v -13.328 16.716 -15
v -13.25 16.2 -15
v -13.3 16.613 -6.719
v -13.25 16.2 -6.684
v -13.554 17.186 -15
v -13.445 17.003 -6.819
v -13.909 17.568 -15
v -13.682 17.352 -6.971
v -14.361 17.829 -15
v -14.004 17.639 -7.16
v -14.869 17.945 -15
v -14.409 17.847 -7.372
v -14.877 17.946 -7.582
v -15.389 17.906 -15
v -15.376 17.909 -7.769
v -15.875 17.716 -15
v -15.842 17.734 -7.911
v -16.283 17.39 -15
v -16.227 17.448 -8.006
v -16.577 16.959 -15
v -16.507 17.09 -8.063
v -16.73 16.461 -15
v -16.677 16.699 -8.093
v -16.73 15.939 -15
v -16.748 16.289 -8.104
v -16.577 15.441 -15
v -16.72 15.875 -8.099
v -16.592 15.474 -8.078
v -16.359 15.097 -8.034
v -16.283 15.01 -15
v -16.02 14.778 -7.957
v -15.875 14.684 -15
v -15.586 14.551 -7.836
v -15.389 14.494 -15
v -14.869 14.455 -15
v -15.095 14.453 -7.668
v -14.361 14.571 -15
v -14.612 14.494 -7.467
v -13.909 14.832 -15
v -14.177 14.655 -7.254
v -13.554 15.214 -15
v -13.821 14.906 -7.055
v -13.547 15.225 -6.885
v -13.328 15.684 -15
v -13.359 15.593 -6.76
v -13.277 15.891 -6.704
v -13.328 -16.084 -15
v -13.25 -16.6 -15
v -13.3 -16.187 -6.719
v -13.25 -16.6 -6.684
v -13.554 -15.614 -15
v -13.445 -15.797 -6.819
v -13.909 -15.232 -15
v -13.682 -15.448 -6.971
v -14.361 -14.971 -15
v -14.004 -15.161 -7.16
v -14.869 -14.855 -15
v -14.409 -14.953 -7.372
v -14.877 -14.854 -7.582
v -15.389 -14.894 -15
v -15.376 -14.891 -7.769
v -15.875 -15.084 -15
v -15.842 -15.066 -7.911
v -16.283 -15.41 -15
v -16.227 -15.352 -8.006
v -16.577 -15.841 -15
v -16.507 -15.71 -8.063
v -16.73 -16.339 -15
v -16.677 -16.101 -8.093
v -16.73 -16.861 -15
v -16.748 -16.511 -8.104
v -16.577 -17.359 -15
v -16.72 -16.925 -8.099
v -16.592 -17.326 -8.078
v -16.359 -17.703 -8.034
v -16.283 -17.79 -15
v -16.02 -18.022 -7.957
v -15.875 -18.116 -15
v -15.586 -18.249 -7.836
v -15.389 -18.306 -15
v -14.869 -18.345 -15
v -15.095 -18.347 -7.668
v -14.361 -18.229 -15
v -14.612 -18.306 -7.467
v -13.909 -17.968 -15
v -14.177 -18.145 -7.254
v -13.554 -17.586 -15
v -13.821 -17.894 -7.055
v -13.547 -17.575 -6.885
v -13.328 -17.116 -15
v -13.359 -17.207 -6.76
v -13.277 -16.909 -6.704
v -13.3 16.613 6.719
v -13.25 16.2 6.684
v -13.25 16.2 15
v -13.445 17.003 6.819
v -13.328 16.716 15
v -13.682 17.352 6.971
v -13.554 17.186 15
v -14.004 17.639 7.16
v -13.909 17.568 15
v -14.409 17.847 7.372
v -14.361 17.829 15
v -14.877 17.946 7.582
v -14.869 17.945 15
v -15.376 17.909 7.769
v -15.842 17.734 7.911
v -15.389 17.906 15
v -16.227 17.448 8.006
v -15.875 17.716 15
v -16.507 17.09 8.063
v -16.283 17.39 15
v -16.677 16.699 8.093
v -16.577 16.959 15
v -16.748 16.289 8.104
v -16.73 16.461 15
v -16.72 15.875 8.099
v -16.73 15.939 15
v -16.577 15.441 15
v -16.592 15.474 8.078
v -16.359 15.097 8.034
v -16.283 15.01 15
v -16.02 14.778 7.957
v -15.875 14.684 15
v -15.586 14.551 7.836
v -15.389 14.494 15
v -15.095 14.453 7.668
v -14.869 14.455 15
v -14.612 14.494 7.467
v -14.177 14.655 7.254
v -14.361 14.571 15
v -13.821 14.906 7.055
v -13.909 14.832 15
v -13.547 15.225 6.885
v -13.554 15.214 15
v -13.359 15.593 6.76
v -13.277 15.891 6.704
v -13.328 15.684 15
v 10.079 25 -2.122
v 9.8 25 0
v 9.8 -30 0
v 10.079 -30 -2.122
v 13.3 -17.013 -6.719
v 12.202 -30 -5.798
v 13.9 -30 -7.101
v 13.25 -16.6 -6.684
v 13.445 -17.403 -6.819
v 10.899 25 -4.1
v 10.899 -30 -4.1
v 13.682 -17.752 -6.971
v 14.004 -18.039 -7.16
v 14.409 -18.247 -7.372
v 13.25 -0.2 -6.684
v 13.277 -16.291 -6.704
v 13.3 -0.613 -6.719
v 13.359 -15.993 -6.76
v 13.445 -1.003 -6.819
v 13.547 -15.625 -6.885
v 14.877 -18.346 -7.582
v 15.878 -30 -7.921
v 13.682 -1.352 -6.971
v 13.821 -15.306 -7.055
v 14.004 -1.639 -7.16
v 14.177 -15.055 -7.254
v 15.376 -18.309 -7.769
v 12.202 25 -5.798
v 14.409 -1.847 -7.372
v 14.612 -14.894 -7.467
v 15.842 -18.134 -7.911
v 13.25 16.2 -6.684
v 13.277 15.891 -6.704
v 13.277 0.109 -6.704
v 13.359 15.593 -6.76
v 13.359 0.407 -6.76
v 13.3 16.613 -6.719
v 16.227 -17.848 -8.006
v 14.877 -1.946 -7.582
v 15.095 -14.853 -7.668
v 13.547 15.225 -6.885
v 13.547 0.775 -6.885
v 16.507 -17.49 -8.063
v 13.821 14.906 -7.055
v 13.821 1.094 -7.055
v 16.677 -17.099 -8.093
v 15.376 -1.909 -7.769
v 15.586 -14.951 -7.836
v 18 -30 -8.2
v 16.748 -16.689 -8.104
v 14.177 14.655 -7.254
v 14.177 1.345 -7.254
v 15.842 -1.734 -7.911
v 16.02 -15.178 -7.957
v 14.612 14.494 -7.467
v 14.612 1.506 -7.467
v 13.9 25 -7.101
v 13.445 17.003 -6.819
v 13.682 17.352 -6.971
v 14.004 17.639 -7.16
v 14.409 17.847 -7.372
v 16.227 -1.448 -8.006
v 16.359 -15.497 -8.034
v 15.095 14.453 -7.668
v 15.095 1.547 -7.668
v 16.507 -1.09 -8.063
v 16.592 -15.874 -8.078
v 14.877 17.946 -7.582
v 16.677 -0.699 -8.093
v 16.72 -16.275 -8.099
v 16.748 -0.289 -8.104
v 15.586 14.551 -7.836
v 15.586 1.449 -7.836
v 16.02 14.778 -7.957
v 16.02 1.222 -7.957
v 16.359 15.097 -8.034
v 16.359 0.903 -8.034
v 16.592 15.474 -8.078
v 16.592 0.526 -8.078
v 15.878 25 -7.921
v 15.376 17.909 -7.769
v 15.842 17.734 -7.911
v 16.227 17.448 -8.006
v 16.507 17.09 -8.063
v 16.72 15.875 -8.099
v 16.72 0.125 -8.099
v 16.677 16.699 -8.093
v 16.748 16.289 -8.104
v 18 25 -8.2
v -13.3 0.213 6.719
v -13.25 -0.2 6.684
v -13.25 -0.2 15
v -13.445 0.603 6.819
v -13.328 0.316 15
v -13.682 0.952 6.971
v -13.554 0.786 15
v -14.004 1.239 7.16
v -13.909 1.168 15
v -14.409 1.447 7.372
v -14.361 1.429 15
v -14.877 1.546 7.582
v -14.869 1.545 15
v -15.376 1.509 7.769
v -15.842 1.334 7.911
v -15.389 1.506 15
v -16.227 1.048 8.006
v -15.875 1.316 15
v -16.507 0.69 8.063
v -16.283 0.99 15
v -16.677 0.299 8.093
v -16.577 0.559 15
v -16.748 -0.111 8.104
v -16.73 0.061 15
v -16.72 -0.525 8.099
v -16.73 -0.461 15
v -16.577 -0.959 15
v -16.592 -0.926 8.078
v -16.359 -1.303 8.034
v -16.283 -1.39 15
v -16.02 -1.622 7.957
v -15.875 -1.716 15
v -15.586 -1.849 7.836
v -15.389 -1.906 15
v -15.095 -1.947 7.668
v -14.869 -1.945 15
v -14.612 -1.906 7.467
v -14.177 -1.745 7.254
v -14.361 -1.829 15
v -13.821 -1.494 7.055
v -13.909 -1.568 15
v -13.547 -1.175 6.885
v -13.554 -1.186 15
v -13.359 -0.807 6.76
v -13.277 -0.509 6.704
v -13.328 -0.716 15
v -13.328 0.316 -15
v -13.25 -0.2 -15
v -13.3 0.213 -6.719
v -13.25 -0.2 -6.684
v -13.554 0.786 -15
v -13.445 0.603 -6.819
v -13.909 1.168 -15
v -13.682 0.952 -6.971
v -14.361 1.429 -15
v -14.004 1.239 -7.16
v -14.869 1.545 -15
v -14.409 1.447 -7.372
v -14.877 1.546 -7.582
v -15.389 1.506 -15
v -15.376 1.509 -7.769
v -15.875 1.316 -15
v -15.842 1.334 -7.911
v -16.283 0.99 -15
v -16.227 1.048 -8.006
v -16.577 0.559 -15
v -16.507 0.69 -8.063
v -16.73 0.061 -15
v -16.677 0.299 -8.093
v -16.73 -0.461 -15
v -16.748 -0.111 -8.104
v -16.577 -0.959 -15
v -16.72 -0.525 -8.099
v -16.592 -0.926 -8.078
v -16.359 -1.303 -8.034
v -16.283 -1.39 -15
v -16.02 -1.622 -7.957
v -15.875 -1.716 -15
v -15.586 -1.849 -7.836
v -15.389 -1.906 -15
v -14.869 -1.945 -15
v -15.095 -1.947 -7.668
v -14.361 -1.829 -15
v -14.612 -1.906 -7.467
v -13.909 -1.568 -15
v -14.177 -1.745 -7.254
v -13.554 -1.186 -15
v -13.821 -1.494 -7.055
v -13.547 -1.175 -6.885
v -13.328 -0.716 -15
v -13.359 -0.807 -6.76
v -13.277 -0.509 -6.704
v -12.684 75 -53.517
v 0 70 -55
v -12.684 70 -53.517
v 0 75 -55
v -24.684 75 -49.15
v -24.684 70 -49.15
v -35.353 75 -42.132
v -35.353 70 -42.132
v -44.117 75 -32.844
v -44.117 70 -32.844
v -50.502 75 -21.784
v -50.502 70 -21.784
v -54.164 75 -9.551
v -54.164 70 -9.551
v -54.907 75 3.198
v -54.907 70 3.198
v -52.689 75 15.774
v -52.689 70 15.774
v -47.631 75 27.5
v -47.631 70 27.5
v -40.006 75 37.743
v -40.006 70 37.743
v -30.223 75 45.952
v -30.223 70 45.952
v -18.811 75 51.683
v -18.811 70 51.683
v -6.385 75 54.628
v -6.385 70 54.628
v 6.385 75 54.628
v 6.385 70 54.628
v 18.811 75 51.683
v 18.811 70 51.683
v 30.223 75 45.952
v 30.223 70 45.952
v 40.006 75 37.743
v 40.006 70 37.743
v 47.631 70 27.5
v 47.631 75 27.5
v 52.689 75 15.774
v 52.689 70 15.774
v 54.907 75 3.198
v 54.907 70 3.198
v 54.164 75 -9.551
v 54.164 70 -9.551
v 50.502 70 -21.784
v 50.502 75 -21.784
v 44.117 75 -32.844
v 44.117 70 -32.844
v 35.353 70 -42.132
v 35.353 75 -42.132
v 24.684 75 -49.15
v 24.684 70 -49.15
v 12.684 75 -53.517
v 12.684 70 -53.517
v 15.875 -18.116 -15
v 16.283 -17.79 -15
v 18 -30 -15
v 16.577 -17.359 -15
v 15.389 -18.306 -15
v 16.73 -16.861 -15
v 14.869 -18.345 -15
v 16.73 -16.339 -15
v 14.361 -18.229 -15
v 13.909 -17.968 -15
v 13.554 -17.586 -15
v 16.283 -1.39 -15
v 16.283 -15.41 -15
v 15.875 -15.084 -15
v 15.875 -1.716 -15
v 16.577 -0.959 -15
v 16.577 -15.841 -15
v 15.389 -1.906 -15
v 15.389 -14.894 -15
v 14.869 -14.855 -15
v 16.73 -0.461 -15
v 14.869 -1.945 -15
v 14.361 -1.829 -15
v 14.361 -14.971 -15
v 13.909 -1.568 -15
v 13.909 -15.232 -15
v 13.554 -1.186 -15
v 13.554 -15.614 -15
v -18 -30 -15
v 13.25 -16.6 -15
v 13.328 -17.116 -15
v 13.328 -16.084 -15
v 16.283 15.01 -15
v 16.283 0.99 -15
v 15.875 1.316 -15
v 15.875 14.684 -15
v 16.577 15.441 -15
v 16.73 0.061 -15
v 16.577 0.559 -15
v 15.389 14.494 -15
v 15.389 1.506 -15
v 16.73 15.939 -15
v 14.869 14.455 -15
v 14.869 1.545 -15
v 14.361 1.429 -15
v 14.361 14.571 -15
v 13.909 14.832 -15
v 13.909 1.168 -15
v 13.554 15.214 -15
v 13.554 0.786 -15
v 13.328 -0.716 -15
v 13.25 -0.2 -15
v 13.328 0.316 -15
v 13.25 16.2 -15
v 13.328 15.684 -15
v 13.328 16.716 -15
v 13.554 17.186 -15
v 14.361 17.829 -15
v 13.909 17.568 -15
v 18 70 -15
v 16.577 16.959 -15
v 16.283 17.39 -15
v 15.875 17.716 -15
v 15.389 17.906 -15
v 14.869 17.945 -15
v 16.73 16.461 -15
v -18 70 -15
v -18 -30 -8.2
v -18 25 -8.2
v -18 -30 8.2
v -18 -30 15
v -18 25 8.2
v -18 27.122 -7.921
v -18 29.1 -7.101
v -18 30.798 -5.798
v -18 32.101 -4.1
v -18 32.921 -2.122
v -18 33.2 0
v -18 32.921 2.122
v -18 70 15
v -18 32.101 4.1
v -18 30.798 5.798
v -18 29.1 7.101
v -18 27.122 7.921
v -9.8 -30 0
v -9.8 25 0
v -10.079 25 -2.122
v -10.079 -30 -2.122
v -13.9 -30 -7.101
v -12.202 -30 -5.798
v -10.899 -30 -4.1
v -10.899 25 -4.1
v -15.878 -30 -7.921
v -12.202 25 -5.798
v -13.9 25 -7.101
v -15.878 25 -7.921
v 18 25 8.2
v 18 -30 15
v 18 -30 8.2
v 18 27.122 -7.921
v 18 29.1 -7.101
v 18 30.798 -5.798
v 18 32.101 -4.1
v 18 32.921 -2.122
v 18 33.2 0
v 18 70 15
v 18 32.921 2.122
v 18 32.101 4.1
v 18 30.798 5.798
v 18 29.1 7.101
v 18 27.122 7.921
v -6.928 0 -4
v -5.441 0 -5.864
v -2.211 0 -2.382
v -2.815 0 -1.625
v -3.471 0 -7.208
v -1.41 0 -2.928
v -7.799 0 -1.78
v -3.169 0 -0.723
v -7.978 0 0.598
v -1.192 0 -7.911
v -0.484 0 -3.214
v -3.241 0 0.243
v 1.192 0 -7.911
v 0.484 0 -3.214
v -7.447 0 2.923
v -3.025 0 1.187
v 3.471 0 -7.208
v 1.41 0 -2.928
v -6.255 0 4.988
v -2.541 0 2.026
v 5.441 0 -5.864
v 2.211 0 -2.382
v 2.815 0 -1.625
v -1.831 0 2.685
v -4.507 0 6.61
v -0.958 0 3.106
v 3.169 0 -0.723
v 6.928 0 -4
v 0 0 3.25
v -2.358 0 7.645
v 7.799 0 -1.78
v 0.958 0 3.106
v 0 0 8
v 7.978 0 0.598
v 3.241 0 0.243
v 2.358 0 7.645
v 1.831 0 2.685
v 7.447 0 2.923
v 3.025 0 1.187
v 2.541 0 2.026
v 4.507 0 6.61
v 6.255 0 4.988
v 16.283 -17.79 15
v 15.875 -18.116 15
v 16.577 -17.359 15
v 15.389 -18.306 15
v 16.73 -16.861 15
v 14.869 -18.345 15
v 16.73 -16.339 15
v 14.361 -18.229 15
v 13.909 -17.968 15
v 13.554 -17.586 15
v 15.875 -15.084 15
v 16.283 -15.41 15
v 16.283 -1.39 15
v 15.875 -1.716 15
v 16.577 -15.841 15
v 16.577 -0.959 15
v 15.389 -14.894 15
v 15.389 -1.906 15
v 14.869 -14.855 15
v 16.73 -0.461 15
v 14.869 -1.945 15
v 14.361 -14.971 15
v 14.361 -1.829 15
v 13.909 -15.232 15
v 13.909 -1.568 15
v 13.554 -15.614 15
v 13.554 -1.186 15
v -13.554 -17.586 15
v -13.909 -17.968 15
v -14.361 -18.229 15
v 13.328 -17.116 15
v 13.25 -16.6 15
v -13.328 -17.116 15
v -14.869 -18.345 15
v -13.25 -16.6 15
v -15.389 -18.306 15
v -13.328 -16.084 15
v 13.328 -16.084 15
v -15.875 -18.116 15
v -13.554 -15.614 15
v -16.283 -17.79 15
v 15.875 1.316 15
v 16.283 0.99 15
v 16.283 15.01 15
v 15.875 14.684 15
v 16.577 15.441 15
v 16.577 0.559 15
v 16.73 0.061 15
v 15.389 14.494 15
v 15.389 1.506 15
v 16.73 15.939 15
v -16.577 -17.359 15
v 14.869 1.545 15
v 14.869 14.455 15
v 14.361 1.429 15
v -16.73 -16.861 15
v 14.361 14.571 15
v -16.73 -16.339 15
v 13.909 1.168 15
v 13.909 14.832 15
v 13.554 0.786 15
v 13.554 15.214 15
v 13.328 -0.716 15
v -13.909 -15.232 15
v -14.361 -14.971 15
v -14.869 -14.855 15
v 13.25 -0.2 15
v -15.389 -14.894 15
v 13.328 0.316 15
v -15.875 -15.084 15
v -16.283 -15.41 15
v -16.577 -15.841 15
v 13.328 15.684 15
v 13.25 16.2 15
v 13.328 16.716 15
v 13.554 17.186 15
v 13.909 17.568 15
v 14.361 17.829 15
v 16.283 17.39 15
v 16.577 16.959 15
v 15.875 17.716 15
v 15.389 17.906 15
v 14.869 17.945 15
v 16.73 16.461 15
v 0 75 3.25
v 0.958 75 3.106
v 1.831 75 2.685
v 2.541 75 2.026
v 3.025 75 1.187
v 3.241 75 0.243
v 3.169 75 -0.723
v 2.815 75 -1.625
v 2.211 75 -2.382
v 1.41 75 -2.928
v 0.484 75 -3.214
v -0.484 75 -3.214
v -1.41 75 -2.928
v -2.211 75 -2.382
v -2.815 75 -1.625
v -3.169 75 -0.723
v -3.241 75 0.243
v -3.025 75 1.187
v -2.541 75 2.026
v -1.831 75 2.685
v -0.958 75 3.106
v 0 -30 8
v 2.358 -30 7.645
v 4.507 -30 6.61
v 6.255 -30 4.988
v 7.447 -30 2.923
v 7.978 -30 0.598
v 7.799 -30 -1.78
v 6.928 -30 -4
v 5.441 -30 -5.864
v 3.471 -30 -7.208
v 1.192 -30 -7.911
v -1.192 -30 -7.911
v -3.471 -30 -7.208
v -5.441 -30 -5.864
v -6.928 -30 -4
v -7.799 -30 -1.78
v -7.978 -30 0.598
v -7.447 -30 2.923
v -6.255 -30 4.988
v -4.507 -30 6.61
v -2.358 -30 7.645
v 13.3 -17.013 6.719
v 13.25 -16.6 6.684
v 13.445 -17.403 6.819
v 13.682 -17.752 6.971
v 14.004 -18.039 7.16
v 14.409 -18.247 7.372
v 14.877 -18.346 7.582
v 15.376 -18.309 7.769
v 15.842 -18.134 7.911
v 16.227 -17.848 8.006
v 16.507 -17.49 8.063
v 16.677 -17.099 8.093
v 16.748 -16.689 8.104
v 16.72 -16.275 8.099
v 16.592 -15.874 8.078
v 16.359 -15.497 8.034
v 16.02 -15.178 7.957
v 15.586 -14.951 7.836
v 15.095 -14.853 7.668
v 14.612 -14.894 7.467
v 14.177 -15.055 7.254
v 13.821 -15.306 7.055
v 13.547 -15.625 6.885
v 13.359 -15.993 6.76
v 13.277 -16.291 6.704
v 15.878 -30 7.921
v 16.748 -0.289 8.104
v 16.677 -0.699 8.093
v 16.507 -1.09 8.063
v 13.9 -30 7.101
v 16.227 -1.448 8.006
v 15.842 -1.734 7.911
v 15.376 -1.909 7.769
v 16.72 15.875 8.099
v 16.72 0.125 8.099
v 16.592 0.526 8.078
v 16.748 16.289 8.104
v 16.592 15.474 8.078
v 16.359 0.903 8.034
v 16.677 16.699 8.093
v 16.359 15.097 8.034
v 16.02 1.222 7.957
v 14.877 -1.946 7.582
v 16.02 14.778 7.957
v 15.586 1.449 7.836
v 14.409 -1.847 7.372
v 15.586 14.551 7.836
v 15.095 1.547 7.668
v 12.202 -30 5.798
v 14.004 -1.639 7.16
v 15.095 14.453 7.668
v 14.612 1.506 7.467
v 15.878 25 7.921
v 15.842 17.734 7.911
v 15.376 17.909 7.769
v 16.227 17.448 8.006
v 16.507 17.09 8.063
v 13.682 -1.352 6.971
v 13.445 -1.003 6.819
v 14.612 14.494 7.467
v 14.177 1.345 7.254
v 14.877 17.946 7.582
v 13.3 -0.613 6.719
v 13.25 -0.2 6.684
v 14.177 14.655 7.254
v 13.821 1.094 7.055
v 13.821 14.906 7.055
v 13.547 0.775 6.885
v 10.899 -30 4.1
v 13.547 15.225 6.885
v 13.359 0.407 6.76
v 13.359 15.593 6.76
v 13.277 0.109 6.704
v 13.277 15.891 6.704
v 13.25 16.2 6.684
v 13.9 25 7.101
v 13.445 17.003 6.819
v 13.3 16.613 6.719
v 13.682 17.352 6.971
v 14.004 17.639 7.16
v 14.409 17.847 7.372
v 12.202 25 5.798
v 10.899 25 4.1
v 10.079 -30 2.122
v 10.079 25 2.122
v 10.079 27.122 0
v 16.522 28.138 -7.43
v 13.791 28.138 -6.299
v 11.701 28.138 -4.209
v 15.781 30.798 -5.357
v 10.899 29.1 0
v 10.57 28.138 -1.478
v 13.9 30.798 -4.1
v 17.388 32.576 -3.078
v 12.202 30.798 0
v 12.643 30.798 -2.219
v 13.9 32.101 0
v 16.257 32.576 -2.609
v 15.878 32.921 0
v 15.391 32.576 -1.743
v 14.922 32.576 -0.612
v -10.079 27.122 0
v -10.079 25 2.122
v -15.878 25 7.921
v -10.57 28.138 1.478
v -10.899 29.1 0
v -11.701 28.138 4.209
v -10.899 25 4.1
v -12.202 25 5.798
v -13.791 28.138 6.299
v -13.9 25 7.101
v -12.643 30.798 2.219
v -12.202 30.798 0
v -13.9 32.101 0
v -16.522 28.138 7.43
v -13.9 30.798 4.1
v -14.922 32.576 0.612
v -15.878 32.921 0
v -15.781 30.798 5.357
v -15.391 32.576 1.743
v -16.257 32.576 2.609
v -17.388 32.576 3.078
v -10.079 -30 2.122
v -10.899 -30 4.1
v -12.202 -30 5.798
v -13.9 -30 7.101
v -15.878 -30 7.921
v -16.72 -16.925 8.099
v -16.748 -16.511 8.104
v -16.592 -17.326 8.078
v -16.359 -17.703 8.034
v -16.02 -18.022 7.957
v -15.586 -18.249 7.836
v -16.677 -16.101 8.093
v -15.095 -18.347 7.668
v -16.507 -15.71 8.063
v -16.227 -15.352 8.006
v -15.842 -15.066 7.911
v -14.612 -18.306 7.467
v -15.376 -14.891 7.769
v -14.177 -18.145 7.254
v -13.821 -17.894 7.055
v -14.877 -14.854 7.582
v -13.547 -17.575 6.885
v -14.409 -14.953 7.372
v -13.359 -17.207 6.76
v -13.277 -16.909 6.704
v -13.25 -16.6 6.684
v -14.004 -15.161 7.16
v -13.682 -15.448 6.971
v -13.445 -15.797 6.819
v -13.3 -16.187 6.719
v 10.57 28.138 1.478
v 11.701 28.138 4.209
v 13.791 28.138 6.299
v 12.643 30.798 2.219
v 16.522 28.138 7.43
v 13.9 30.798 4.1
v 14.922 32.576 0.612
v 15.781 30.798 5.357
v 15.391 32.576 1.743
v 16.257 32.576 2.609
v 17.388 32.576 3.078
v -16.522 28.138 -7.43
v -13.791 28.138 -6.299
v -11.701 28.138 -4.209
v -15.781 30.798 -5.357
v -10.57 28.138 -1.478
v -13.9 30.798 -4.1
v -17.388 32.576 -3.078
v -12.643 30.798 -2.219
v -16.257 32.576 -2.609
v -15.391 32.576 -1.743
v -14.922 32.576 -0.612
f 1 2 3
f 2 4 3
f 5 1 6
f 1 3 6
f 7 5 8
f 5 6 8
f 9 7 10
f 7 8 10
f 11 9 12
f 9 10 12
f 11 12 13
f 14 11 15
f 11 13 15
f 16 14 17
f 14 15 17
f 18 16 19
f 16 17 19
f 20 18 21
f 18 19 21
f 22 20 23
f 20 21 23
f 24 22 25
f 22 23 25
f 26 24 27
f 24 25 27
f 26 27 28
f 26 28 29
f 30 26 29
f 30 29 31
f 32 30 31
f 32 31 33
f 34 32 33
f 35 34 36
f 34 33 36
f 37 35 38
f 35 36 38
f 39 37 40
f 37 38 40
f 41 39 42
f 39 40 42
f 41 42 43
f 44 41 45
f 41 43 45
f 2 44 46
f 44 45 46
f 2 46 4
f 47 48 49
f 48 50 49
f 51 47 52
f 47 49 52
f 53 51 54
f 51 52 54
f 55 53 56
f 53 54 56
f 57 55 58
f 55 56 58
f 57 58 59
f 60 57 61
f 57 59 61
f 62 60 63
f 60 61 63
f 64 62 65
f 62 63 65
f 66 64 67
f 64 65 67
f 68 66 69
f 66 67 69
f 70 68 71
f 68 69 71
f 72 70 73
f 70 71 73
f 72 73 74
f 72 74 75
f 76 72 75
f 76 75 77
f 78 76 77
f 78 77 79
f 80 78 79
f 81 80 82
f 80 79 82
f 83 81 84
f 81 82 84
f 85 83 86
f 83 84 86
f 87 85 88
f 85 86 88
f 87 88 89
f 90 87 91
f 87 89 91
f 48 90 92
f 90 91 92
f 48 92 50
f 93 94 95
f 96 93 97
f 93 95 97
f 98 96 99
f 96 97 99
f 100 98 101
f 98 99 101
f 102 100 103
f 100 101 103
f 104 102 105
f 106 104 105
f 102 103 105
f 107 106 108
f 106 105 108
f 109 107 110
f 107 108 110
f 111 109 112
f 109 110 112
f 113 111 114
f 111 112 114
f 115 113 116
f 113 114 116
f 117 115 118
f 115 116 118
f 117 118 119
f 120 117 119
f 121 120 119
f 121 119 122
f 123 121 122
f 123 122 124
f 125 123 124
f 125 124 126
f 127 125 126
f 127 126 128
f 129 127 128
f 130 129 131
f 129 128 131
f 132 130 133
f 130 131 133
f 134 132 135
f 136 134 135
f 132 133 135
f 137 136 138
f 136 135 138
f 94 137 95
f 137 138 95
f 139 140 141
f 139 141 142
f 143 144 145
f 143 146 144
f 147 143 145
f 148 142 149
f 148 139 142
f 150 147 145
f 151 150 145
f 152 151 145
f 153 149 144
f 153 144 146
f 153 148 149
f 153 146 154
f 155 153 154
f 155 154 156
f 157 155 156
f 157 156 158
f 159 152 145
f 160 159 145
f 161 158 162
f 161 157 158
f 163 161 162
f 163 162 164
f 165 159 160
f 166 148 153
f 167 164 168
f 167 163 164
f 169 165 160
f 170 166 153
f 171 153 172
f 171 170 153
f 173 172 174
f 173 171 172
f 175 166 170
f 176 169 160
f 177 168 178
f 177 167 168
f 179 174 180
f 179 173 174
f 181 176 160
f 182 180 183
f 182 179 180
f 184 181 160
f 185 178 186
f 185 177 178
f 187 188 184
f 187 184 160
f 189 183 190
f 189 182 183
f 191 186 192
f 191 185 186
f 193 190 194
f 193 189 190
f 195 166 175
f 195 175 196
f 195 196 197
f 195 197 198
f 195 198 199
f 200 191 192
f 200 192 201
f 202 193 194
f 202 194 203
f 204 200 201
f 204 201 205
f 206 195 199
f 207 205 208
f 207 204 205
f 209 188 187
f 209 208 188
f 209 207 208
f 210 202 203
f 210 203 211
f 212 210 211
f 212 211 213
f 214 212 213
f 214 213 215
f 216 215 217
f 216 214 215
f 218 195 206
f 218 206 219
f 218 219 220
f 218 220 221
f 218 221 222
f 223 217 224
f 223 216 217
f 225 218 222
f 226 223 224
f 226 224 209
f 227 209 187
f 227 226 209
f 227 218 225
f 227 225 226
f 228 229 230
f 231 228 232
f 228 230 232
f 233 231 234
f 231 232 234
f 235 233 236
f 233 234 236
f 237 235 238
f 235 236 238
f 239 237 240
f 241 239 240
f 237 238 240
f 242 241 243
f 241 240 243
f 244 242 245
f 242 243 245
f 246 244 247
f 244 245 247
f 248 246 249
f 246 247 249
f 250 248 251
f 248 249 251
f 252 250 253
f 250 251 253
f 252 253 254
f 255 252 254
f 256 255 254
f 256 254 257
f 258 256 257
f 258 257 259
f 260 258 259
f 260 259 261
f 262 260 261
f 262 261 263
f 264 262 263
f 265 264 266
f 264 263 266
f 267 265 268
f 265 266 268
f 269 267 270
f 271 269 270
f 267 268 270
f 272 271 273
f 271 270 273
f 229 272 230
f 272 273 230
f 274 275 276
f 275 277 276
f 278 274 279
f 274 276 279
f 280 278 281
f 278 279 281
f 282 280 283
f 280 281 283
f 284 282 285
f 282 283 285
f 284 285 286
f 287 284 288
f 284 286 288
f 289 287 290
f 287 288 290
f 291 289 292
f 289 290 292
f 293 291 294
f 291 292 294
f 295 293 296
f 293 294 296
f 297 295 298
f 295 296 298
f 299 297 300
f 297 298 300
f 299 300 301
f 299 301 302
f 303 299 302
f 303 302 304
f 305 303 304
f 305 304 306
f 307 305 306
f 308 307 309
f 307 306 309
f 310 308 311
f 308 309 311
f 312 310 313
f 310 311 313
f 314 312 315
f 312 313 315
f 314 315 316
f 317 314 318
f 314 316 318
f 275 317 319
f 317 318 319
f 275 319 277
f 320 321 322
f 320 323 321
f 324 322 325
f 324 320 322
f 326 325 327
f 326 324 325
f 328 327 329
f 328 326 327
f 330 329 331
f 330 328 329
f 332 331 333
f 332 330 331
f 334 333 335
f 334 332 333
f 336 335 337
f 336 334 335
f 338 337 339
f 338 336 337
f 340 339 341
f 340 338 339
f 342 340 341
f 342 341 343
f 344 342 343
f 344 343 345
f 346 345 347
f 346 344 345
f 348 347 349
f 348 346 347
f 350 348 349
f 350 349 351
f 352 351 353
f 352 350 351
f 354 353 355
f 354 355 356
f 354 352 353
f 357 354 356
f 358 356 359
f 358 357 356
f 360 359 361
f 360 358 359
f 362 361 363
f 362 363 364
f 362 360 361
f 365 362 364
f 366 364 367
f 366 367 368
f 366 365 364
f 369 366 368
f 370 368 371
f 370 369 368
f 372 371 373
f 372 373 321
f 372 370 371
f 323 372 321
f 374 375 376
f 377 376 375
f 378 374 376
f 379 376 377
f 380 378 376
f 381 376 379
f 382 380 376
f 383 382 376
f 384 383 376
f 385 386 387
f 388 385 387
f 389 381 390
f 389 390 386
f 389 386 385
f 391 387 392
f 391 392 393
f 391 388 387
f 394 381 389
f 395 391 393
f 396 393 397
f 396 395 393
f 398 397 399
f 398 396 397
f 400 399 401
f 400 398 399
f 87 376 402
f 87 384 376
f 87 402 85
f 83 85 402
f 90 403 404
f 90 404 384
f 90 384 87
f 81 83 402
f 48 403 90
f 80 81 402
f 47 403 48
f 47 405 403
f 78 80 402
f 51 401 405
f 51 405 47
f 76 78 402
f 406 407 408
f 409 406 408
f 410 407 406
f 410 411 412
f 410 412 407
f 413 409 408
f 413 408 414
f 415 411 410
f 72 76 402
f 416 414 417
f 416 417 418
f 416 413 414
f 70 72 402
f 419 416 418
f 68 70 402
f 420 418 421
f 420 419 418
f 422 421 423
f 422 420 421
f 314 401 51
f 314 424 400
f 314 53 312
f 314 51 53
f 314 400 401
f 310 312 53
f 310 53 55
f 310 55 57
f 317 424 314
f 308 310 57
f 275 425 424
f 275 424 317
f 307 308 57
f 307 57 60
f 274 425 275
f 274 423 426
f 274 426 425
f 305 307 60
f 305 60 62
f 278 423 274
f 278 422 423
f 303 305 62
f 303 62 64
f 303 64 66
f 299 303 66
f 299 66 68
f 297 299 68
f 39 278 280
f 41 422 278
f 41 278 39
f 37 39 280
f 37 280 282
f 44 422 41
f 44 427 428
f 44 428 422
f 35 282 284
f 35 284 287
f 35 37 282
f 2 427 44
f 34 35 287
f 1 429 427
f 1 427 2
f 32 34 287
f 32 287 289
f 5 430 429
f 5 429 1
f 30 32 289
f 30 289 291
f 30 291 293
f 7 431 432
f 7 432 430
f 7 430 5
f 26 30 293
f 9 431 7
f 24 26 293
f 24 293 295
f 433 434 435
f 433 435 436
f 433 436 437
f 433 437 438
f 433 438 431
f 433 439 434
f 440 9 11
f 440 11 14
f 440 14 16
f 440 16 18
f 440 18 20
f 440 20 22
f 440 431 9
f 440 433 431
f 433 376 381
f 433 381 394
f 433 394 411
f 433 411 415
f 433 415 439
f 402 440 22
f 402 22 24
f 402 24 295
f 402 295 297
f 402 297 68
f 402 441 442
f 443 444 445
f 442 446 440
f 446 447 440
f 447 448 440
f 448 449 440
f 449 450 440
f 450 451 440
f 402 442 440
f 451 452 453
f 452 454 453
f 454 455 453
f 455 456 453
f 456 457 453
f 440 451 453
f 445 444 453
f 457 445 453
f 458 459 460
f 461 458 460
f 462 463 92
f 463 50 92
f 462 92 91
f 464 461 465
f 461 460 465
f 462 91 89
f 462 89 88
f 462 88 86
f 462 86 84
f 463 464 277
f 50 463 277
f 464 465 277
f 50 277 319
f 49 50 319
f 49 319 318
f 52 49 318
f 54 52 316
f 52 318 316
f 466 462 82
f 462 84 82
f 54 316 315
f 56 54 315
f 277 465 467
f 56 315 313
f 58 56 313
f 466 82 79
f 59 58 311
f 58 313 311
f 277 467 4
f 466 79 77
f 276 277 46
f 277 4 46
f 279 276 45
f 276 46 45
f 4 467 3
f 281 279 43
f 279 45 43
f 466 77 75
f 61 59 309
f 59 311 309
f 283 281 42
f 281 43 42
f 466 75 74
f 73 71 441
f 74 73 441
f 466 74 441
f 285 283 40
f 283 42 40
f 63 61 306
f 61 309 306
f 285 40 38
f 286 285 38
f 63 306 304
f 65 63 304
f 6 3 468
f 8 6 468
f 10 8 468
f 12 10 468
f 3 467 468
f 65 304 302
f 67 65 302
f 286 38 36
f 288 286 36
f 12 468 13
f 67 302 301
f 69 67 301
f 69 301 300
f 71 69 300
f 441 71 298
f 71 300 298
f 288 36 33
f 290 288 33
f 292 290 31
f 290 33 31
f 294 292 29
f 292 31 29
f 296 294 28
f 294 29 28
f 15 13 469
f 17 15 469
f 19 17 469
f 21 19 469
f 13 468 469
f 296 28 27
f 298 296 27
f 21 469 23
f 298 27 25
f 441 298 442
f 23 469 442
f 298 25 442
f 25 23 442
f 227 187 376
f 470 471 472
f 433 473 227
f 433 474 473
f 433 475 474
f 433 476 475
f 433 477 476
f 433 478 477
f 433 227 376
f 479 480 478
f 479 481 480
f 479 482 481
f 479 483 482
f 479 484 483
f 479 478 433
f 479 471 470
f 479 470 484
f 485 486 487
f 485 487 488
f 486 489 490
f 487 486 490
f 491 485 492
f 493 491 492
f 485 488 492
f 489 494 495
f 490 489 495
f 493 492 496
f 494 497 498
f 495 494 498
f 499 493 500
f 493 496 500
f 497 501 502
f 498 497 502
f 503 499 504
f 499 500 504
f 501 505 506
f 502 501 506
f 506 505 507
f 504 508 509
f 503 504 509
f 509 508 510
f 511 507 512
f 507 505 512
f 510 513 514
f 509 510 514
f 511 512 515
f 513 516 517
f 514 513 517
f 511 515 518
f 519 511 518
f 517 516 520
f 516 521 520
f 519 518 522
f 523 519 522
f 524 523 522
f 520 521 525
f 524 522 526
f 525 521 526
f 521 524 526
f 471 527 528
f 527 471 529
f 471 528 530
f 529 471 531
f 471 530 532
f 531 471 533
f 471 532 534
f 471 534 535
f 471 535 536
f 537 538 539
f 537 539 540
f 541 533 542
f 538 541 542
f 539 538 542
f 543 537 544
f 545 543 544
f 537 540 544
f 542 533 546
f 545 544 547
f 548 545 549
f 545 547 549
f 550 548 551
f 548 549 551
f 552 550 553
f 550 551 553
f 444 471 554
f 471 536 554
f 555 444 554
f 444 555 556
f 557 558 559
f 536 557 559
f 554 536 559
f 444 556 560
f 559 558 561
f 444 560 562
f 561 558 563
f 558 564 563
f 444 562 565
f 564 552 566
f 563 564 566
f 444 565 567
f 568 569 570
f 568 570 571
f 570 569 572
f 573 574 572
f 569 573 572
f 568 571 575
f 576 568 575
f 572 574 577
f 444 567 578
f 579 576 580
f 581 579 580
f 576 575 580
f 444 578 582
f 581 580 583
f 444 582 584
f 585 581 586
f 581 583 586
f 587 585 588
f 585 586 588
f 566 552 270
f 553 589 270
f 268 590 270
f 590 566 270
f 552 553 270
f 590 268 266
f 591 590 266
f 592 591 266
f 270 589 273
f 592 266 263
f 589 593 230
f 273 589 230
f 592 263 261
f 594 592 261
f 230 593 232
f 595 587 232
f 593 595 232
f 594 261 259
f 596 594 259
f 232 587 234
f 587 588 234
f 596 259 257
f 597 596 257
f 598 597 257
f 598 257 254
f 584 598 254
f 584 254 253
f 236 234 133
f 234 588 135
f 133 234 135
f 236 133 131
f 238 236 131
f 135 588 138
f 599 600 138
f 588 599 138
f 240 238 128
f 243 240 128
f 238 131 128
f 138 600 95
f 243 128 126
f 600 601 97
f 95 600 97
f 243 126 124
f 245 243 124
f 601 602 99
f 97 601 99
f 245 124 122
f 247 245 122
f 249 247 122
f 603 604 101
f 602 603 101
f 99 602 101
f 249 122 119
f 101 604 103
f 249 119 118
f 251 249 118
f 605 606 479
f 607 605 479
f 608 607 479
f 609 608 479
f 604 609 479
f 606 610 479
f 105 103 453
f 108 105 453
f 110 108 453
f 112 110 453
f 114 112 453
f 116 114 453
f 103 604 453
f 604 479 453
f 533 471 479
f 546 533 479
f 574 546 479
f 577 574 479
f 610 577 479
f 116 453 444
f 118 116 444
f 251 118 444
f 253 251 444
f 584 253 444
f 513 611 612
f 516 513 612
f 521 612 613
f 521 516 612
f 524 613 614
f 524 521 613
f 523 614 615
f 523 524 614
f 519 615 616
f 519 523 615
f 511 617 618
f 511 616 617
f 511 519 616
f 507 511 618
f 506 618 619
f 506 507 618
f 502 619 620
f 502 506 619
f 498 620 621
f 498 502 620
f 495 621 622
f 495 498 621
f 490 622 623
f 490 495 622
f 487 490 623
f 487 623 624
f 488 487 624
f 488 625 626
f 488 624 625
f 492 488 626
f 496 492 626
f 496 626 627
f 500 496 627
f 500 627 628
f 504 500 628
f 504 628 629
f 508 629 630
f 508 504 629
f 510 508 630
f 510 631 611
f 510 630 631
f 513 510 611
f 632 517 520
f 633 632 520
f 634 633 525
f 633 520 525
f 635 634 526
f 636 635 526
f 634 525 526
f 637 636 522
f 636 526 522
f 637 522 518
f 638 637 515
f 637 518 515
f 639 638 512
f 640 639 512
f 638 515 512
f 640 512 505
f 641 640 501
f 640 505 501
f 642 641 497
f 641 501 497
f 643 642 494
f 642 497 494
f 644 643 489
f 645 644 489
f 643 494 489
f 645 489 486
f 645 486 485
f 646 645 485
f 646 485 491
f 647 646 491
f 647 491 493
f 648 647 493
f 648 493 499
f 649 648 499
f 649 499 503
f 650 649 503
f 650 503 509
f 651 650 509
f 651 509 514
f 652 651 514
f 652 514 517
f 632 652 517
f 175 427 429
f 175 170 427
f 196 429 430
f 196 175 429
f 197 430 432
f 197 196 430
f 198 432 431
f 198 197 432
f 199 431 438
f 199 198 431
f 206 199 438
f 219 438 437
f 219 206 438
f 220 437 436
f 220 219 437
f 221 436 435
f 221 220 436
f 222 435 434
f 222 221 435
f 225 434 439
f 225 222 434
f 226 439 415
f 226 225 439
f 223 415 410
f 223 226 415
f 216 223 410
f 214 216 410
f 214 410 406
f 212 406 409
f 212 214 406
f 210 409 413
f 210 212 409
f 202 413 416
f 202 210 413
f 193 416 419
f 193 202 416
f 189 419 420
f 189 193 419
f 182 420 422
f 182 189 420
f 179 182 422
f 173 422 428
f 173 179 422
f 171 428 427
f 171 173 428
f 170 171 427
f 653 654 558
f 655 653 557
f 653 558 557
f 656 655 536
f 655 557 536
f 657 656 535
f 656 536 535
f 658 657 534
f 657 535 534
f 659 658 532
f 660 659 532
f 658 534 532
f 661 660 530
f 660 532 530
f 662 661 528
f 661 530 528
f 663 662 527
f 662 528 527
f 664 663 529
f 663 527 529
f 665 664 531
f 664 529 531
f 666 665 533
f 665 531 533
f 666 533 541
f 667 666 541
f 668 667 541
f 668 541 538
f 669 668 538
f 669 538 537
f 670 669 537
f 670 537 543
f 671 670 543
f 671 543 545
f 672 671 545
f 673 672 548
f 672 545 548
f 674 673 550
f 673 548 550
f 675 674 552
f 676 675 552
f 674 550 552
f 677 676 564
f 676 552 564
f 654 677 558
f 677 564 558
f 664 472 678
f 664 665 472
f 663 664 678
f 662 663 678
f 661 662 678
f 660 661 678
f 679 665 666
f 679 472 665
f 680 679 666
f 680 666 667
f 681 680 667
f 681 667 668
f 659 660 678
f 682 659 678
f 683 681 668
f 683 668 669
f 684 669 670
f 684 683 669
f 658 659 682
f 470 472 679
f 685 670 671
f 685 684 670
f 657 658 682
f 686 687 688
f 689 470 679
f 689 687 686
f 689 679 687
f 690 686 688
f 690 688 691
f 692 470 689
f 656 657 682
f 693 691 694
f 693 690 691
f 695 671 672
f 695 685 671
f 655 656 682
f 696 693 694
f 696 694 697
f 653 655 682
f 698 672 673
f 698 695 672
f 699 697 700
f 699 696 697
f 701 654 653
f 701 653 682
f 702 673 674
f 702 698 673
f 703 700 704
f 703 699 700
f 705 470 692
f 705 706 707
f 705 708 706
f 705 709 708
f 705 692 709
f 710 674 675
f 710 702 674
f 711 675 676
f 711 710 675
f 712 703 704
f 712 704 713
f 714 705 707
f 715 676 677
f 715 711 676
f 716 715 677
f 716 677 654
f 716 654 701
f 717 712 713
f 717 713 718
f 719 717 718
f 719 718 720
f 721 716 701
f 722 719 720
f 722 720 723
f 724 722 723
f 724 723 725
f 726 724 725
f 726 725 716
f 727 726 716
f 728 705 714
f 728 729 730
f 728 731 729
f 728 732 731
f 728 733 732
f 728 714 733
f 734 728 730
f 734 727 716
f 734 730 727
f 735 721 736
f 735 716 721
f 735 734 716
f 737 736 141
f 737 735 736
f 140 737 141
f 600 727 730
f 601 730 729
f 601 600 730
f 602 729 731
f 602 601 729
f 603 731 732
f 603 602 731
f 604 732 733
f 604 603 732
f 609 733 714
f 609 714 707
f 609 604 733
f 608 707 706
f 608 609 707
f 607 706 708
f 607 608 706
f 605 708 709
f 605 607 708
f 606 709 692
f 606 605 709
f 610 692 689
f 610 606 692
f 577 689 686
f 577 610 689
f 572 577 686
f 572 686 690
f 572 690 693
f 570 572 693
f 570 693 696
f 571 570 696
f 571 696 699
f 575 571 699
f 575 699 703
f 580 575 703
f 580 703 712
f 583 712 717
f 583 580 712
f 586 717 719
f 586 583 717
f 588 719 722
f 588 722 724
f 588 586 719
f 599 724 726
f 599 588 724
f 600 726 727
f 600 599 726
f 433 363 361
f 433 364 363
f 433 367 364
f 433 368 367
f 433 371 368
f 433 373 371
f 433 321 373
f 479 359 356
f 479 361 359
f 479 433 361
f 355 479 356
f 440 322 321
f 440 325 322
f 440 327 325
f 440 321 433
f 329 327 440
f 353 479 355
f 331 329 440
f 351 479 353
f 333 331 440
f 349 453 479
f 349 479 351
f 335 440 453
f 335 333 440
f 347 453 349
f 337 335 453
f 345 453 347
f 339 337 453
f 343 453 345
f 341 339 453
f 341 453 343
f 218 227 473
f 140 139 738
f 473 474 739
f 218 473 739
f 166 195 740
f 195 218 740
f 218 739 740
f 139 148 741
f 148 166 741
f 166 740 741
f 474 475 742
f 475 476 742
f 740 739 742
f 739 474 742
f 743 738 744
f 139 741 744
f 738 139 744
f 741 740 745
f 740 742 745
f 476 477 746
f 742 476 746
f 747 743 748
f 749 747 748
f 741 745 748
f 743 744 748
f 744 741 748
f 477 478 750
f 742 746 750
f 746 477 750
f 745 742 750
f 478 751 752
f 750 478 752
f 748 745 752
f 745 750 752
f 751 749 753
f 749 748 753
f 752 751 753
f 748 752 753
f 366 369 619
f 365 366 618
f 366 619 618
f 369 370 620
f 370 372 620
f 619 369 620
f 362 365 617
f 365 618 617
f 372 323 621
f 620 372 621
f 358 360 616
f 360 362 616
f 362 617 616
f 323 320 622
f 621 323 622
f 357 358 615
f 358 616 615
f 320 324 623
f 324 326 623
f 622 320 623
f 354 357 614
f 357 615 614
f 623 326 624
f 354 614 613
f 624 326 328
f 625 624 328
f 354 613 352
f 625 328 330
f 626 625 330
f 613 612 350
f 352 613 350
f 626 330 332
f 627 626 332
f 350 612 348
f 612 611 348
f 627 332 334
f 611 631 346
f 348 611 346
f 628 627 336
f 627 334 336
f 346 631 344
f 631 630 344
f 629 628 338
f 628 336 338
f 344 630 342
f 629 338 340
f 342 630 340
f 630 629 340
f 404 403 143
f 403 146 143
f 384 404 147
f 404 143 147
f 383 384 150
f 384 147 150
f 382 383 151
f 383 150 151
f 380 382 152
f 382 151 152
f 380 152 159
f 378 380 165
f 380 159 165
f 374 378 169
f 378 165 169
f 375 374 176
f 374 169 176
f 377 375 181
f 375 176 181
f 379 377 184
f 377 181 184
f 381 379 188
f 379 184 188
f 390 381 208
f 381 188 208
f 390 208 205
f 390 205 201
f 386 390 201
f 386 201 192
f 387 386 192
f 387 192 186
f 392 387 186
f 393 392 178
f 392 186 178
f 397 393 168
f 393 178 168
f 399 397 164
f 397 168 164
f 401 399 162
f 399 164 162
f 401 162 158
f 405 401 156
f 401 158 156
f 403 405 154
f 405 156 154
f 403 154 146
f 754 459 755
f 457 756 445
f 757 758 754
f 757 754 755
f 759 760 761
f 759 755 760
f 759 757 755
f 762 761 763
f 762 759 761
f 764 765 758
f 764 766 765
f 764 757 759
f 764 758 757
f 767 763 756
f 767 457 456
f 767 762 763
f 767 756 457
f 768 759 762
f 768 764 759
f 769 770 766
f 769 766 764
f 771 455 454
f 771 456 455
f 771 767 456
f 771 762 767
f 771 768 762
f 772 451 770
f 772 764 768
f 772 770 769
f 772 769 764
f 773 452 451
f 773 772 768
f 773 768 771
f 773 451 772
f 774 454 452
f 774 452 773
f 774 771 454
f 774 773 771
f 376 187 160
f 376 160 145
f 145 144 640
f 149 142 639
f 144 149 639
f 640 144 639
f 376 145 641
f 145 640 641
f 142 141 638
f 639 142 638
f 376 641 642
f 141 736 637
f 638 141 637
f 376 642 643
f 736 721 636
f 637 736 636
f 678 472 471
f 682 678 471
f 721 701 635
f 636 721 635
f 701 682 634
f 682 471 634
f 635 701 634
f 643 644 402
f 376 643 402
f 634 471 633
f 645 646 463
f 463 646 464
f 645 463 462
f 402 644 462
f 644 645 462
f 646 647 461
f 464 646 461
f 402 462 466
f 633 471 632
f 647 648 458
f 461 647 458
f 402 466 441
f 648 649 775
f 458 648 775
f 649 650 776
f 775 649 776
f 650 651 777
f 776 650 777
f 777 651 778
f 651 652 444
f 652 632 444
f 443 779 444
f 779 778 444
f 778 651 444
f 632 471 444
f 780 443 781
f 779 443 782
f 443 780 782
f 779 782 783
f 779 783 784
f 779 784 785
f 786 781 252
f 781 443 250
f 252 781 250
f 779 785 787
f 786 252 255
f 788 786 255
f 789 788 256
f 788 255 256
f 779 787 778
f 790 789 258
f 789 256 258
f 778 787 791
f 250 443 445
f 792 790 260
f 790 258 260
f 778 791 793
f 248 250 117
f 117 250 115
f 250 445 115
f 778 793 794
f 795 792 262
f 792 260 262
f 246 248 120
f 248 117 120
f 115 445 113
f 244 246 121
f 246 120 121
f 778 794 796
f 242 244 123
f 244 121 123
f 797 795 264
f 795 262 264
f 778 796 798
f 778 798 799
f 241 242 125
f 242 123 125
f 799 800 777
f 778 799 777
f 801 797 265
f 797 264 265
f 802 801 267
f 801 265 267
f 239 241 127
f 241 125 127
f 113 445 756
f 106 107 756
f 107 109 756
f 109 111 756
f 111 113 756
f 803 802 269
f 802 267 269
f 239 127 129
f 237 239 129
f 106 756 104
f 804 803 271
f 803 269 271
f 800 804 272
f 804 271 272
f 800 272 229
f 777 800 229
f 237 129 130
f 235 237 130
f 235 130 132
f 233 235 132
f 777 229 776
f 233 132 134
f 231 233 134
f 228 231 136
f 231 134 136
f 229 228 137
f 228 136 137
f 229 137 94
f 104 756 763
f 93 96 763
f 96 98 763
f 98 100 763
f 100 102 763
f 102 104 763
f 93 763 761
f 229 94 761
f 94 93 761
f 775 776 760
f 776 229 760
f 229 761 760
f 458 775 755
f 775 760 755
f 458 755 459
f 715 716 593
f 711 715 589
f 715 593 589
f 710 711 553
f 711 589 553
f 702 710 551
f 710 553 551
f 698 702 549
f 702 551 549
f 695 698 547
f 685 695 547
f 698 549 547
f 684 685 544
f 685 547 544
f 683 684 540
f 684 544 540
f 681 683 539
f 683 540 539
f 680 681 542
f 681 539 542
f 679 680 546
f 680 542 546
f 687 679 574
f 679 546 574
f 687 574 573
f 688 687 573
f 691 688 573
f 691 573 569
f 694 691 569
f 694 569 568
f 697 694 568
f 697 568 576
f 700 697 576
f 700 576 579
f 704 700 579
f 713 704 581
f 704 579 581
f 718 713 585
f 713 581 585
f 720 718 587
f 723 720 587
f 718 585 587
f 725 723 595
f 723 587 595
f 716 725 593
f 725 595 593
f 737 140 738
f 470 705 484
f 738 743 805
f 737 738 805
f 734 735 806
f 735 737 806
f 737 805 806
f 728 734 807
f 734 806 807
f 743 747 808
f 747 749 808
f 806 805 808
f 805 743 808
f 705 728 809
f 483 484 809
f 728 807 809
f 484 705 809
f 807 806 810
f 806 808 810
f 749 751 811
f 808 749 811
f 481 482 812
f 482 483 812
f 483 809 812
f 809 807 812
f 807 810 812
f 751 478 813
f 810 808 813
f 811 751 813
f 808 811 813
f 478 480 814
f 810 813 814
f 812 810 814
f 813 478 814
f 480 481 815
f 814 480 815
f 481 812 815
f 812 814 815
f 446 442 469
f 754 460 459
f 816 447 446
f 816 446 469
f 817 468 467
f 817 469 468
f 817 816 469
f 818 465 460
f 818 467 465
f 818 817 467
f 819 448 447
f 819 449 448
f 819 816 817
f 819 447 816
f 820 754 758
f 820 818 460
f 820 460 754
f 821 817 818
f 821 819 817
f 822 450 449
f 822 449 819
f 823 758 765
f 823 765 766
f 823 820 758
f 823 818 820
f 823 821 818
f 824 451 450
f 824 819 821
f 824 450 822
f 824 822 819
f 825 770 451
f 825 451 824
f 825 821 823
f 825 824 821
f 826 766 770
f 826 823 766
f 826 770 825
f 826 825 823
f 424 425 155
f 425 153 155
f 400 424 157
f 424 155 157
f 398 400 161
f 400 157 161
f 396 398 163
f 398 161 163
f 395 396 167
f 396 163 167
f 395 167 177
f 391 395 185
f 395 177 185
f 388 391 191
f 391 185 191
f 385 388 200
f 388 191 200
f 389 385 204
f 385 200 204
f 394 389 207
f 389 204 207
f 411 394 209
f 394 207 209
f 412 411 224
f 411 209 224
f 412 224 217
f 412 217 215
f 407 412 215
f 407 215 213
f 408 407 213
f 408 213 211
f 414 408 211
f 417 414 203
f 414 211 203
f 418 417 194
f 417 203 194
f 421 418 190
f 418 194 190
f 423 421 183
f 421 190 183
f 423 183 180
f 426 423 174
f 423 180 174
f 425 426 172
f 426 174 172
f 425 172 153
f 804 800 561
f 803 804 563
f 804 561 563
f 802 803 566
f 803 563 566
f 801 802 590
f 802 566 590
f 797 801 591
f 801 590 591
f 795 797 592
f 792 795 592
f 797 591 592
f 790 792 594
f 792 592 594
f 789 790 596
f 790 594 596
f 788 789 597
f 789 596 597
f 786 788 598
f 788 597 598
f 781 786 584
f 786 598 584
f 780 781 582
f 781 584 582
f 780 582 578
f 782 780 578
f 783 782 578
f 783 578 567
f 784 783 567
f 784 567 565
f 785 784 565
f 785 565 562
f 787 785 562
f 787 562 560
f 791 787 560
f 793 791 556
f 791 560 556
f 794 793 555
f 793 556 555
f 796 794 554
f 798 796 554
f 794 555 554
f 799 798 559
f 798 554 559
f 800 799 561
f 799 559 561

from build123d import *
from build123d.topology import SkipClean

# Parameters (mm, degrees)
SKETCH_5_W                 = 18
SKETCH_5_H                 = 100
EXTRUDE_1_DEPTH            = 15
PATTERN_LINEAR_1_COUNT     = 2
PATTERN_LINEAR_1_PITCH     = 16.1
PATTERN_LINEAR_1_COL_COUNT = 2
PATTERN_LINEAR_1_COL_PITCH = 16.1
SKETCH_9_W                 = 55
SKETCH_9_H                 = 5
CUT_EXTRUDE_1_DEPTH        = 109.050913925
CUT_EXTRUDE_1_DEPTH_BACK   = 109.050913925
SKETCH_12_R                = 3.25
SKETCH_15_R                = 8
CUT_EXTRUDE_4_DEPTH        = 109.050913925
SKETCH_17_W                = 8.2
SKETCH_17_H                = 55
SKETCH_19_R                = 1.75
CUT_EXTRUDE_7_DEPTH        = 109.050913925
PATTERN_LINEAR_2_COUNT     = 3
PATTERN_LINEAR_2_PITCH     = 16.4
MIRROR_7_COPY_1_SKETCH_R   = 1.75
MIRROR_7_COPY_1_DEPTH      = 109.050913925
MIRROR_7_COPY_2_SKETCH_R   = 1.75
MIRROR_7_COPY_2_DEPTH      = 109.050913925
MIRROR_7_COPY_3_SKETCH_R   = 1.75
MIRROR_7_COPY_3_DEPTH      = 109.050913925


with BuildPart() as part:
    # 草图5 → 凸台-拉伸1 (new, symmetric)
    with BuildSketch(Plane.XY):
        with Locations((-9, 20)):
            Rectangle(SKETCH_5_W, SKETCH_5_H)
    extrude_1 = extrude(amount=EXTRUDE_1_DEPTH, both=True)

    # 草图7 → 切除-旋转1 (revolve, cut)
    with BuildSketch(Plane.XY):
        with BuildLine():
            Line((-18, 8), (-18, -8))
            ThreePointArc((-18, -8), (-10, 0), (-18, 8))
        make_face()
    cut_revolve_1 = revolve(axis=Axis((-18, 8, 0), (0, -1, 0)), mode=Mode.SUBTRACT)

    # 阵列(线性)1: 切除-旋转1 ×2
    with Locations(*[(0, i * PATTERN_LINEAR_1_PITCH, 0) for i in range(1, PATTERN_LINEAR_1_COUNT)]):
        add(cut_revolve_1, mode=Mode.SUBTRACT)

    # 阵列(线性)1 col: 切除-旋转1 ×2
    with Locations(*[(0, -i * PATTERN_LINEAR_1_COL_PITCH, 0) for i in range(1, PATTERN_LINEAR_1_COL_COUNT)]):
        add(cut_revolve_1, mode=Mode.SUBTRACT)

    # 镜向2: 凸台-拉伸1 across plane
    add(extrude_1.mirror(Plane(origin=(0, 0, 0), x_dir=(0, 0, 1), z_dir=(1, 0, 0))))

    # 镜向3: 切除-旋转1 across plane
    with SkipClean():  # the faces are left unmerged after this step: merging them gives an invalid solid
        add(cut_revolve_1.mirror(Plane(origin=(0, 0, 0), x_dir=(0, 0, 1), z_dir=(1, 0, 0))), mode=Mode.SUBTRACT)

    # 镜向4 copy 1 sketch → 镜向4 copy 1 (revolve, cut)
    with SkipClean():  # the faces are left unmerged after this step: merging them gives an invalid solid
        with BuildSketch(Plane(origin=(0, 16.1, 0), x_dir=(-1, 0, 0), z_dir=(0, 0, 1))):
            with BuildLine():
                Line((-18, -8), (-18, 8))
                ThreePointArc((-18, 8), (-10, 0), (-18, -8))
            make_face()
        revolve(axis=Axis((18, 24.1, 0), (0, 1, 0)), mode=Mode.SUBTRACT)

    # 镜向4 copy 2 sketch → 镜向4 copy 2 (revolve, cut)
    with SkipClean():  # the faces are left unmerged after this step: merging them gives an invalid solid
        with BuildSketch(Plane(origin=(0, -16.1, 0), x_dir=(-1, 0, 0), z_dir=(0, 0, 1))):
            with BuildLine():
                Line((-18, -8), (-18, 8))
                ThreePointArc((-18, 8), (-10, 0), (-18, -8))
            make_face()
        revolve(axis=Axis((18, -8.1, 0), (0, 1, 0)), mode=Mode.SUBTRACT)

    # 镜向4 copy 3 sketch → 镜向4 copy 3 (revolve, cut)
    with SkipClean():  # the faces are left unmerged after this step: merging them gives an invalid solid
        with BuildSketch(Plane(origin=(0, 0, 0), x_dir=(-1, 0, 0), z_dir=(0, 0, 1))):
            with BuildLine():
                Line((-18, -8), (-18, 8))
                ThreePointArc((-18, 8), (-10, 0), (-18, -8))
            make_face()
        revolve(axis=Axis((18, 8, 0), (0, 1, 0)), mode=Mode.SUBTRACT)

    # 草图9 → 旋转1 (revolve)
    with SkipClean():  # the faces are left unmerged after this step: merging them gives an invalid solid
        with BuildSketch(Plane.XY):
            with Locations((27.5, 72.5)):
                Rectangle(SKETCH_9_W, SKETCH_9_H)
        revolve(axis=Axis((0, 70, 0), (0, 1, 0)))

    # 草图12 → 切除-拉伸1 (cut, two sides: drawn at the far end of the back side and taken through both)
    with SkipClean():  # the faces are left unmerged after this step: merging them gives an invalid solid
        with BuildSketch(Plane(origin=(0, 0, 0), x_dir=(1, 0, 0), z_dir=(0, 1, 0)).offset(-CUT_EXTRUDE_1_DEPTH_BACK)):
            Circle(SKETCH_12_R)
        extrude(amount=CUT_EXTRUDE_1_DEPTH + CUT_EXTRUDE_1_DEPTH_BACK, mode=Mode.SUBTRACT)

    # 草图15 → 切除-拉伸4 (cut, through all)
    with SkipClean():  # the faces are left unmerged after this step: merging them gives an invalid solid
        with BuildSketch(Plane(origin=(0, 0, 0), x_dir=(1, 0, 0), z_dir=(0, 1, 0))):
            Circle(SKETCH_15_R)
        extrude(amount=-CUT_EXTRUDE_4_DEPTH, mode=Mode.SUBTRACT)

    # 草图18 → 切除-旋转2 (revolve, cut)
    with SkipClean():  # the faces are left unmerged after this step: merging them gives an invalid solid
        with BuildSketch(Plane.XY):
            with BuildLine():
                Line((-18, 33.2), (-18, 16.8))
                ThreePointArc((-18, 16.8), (-9.8, 25), (-18, 33.2))
            make_face()
        cut_revolve_2 = revolve(axis=Axis((-18, 33.2, 0), (0, -1, 0)), mode=Mode.SUBTRACT)

    # 草图17 → 切除-旋转3 (revolve, cut)
    with SkipClean():  # the faces are left unmerged after this step: merging them gives an invalid solid
        with BuildSketch(Plane.XY):
            with Locations((-13.9, -2.5)):
                Rectangle(SKETCH_17_W, SKETCH_17_H)
        cut_revolve_3 = revolve(axis=Axis((-18, -30, 0), (0, 1, 0)), mode=Mode.SUBTRACT)

    # 镜向5: 切除-旋转2 across plane
    with SkipClean():  # the faces are left unmerged after this step: merging them gives an invalid solid
        add(cut_revolve_2.mirror(Plane(origin=(0, 0, 0), x_dir=(0, 0, 1), z_dir=(1, 0, 0))), mode=Mode.SUBTRACT)

    # 镜向6: 切除-旋转3 across plane
    with SkipClean():  # the faces are left unmerged after this step: merging them gives an invalid solid
        add(cut_revolve_3.mirror(Plane(origin=(0, 0, 0), x_dir=(0, 0, 1), z_dir=(1, 0, 0))), mode=Mode.SUBTRACT)

    # 草图19 → 切除-拉伸7 (cut, symmetric)
    with SkipClean():  # the faces are left unmerged after this step: merging them gives an invalid solid
        with BuildSketch(Plane.XY):
            with Locations((-15, 16.2)):
                Circle(SKETCH_19_R)
        cut_extrude_7 = extrude(amount=CUT_EXTRUDE_7_DEPTH, both=True, mode=Mode.SUBTRACT)

    # 阵列(线性)2: 切除-拉伸7 ×3
    with SkipClean():  # the faces are left unmerged after this step: merging them gives an invalid solid
        with Locations(*[(0, -i * PATTERN_LINEAR_2_PITCH, 0) for i in range(1, PATTERN_LINEAR_2_COUNT)]):
            add(cut_extrude_7, mode=Mode.SUBTRACT)

    # 镜向7 copy 1 sketch → 镜向7 copy 1 (cut, symmetric)
    with SkipClean():  # the faces are left unmerged after this step: merging them gives an invalid solid
        with BuildSketch(Plane(origin=(0, -16.4, 0), x_dir=(-1, 0, 0), z_dir=(0, 0, 1))):
            with Locations((-15, -16.2)):
                Circle(MIRROR_7_COPY_1_SKETCH_R)
        extrude(amount=MIRROR_7_COPY_1_DEPTH, both=True, mode=Mode.SUBTRACT)

    # 镜向7 copy 2 sketch → 镜向7 copy 2 (cut, symmetric)
    with SkipClean():  # the faces are left unmerged after this step: merging them gives an invalid solid
        with BuildSketch(Plane(origin=(0, -32.8, 0), x_dir=(-1, 0, 0), z_dir=(0, 0, 1))):
            with Locations((-15, -16.2)):
                Circle(MIRROR_7_COPY_2_SKETCH_R)
        extrude(amount=MIRROR_7_COPY_2_DEPTH, both=True, mode=Mode.SUBTRACT)

    # 镜向7 copy 3 sketch → 镜向7 copy 3 (cut, symmetric)
    with SkipClean():  # the faces are left unmerged after this step: merging them gives an invalid solid
        with BuildSketch(Plane(origin=(0, 0, 0), x_dir=(-1, 0, 0), z_dir=(0, 0, 1))):
            with Locations((-15, -16.2)):
                Circle(MIRROR_7_COPY_3_SKETCH_R)
        extrude(amount=MIRROR_7_COPY_3_DEPTH, both=True, mode=Mode.SUBTRACT)


solid = part.part
